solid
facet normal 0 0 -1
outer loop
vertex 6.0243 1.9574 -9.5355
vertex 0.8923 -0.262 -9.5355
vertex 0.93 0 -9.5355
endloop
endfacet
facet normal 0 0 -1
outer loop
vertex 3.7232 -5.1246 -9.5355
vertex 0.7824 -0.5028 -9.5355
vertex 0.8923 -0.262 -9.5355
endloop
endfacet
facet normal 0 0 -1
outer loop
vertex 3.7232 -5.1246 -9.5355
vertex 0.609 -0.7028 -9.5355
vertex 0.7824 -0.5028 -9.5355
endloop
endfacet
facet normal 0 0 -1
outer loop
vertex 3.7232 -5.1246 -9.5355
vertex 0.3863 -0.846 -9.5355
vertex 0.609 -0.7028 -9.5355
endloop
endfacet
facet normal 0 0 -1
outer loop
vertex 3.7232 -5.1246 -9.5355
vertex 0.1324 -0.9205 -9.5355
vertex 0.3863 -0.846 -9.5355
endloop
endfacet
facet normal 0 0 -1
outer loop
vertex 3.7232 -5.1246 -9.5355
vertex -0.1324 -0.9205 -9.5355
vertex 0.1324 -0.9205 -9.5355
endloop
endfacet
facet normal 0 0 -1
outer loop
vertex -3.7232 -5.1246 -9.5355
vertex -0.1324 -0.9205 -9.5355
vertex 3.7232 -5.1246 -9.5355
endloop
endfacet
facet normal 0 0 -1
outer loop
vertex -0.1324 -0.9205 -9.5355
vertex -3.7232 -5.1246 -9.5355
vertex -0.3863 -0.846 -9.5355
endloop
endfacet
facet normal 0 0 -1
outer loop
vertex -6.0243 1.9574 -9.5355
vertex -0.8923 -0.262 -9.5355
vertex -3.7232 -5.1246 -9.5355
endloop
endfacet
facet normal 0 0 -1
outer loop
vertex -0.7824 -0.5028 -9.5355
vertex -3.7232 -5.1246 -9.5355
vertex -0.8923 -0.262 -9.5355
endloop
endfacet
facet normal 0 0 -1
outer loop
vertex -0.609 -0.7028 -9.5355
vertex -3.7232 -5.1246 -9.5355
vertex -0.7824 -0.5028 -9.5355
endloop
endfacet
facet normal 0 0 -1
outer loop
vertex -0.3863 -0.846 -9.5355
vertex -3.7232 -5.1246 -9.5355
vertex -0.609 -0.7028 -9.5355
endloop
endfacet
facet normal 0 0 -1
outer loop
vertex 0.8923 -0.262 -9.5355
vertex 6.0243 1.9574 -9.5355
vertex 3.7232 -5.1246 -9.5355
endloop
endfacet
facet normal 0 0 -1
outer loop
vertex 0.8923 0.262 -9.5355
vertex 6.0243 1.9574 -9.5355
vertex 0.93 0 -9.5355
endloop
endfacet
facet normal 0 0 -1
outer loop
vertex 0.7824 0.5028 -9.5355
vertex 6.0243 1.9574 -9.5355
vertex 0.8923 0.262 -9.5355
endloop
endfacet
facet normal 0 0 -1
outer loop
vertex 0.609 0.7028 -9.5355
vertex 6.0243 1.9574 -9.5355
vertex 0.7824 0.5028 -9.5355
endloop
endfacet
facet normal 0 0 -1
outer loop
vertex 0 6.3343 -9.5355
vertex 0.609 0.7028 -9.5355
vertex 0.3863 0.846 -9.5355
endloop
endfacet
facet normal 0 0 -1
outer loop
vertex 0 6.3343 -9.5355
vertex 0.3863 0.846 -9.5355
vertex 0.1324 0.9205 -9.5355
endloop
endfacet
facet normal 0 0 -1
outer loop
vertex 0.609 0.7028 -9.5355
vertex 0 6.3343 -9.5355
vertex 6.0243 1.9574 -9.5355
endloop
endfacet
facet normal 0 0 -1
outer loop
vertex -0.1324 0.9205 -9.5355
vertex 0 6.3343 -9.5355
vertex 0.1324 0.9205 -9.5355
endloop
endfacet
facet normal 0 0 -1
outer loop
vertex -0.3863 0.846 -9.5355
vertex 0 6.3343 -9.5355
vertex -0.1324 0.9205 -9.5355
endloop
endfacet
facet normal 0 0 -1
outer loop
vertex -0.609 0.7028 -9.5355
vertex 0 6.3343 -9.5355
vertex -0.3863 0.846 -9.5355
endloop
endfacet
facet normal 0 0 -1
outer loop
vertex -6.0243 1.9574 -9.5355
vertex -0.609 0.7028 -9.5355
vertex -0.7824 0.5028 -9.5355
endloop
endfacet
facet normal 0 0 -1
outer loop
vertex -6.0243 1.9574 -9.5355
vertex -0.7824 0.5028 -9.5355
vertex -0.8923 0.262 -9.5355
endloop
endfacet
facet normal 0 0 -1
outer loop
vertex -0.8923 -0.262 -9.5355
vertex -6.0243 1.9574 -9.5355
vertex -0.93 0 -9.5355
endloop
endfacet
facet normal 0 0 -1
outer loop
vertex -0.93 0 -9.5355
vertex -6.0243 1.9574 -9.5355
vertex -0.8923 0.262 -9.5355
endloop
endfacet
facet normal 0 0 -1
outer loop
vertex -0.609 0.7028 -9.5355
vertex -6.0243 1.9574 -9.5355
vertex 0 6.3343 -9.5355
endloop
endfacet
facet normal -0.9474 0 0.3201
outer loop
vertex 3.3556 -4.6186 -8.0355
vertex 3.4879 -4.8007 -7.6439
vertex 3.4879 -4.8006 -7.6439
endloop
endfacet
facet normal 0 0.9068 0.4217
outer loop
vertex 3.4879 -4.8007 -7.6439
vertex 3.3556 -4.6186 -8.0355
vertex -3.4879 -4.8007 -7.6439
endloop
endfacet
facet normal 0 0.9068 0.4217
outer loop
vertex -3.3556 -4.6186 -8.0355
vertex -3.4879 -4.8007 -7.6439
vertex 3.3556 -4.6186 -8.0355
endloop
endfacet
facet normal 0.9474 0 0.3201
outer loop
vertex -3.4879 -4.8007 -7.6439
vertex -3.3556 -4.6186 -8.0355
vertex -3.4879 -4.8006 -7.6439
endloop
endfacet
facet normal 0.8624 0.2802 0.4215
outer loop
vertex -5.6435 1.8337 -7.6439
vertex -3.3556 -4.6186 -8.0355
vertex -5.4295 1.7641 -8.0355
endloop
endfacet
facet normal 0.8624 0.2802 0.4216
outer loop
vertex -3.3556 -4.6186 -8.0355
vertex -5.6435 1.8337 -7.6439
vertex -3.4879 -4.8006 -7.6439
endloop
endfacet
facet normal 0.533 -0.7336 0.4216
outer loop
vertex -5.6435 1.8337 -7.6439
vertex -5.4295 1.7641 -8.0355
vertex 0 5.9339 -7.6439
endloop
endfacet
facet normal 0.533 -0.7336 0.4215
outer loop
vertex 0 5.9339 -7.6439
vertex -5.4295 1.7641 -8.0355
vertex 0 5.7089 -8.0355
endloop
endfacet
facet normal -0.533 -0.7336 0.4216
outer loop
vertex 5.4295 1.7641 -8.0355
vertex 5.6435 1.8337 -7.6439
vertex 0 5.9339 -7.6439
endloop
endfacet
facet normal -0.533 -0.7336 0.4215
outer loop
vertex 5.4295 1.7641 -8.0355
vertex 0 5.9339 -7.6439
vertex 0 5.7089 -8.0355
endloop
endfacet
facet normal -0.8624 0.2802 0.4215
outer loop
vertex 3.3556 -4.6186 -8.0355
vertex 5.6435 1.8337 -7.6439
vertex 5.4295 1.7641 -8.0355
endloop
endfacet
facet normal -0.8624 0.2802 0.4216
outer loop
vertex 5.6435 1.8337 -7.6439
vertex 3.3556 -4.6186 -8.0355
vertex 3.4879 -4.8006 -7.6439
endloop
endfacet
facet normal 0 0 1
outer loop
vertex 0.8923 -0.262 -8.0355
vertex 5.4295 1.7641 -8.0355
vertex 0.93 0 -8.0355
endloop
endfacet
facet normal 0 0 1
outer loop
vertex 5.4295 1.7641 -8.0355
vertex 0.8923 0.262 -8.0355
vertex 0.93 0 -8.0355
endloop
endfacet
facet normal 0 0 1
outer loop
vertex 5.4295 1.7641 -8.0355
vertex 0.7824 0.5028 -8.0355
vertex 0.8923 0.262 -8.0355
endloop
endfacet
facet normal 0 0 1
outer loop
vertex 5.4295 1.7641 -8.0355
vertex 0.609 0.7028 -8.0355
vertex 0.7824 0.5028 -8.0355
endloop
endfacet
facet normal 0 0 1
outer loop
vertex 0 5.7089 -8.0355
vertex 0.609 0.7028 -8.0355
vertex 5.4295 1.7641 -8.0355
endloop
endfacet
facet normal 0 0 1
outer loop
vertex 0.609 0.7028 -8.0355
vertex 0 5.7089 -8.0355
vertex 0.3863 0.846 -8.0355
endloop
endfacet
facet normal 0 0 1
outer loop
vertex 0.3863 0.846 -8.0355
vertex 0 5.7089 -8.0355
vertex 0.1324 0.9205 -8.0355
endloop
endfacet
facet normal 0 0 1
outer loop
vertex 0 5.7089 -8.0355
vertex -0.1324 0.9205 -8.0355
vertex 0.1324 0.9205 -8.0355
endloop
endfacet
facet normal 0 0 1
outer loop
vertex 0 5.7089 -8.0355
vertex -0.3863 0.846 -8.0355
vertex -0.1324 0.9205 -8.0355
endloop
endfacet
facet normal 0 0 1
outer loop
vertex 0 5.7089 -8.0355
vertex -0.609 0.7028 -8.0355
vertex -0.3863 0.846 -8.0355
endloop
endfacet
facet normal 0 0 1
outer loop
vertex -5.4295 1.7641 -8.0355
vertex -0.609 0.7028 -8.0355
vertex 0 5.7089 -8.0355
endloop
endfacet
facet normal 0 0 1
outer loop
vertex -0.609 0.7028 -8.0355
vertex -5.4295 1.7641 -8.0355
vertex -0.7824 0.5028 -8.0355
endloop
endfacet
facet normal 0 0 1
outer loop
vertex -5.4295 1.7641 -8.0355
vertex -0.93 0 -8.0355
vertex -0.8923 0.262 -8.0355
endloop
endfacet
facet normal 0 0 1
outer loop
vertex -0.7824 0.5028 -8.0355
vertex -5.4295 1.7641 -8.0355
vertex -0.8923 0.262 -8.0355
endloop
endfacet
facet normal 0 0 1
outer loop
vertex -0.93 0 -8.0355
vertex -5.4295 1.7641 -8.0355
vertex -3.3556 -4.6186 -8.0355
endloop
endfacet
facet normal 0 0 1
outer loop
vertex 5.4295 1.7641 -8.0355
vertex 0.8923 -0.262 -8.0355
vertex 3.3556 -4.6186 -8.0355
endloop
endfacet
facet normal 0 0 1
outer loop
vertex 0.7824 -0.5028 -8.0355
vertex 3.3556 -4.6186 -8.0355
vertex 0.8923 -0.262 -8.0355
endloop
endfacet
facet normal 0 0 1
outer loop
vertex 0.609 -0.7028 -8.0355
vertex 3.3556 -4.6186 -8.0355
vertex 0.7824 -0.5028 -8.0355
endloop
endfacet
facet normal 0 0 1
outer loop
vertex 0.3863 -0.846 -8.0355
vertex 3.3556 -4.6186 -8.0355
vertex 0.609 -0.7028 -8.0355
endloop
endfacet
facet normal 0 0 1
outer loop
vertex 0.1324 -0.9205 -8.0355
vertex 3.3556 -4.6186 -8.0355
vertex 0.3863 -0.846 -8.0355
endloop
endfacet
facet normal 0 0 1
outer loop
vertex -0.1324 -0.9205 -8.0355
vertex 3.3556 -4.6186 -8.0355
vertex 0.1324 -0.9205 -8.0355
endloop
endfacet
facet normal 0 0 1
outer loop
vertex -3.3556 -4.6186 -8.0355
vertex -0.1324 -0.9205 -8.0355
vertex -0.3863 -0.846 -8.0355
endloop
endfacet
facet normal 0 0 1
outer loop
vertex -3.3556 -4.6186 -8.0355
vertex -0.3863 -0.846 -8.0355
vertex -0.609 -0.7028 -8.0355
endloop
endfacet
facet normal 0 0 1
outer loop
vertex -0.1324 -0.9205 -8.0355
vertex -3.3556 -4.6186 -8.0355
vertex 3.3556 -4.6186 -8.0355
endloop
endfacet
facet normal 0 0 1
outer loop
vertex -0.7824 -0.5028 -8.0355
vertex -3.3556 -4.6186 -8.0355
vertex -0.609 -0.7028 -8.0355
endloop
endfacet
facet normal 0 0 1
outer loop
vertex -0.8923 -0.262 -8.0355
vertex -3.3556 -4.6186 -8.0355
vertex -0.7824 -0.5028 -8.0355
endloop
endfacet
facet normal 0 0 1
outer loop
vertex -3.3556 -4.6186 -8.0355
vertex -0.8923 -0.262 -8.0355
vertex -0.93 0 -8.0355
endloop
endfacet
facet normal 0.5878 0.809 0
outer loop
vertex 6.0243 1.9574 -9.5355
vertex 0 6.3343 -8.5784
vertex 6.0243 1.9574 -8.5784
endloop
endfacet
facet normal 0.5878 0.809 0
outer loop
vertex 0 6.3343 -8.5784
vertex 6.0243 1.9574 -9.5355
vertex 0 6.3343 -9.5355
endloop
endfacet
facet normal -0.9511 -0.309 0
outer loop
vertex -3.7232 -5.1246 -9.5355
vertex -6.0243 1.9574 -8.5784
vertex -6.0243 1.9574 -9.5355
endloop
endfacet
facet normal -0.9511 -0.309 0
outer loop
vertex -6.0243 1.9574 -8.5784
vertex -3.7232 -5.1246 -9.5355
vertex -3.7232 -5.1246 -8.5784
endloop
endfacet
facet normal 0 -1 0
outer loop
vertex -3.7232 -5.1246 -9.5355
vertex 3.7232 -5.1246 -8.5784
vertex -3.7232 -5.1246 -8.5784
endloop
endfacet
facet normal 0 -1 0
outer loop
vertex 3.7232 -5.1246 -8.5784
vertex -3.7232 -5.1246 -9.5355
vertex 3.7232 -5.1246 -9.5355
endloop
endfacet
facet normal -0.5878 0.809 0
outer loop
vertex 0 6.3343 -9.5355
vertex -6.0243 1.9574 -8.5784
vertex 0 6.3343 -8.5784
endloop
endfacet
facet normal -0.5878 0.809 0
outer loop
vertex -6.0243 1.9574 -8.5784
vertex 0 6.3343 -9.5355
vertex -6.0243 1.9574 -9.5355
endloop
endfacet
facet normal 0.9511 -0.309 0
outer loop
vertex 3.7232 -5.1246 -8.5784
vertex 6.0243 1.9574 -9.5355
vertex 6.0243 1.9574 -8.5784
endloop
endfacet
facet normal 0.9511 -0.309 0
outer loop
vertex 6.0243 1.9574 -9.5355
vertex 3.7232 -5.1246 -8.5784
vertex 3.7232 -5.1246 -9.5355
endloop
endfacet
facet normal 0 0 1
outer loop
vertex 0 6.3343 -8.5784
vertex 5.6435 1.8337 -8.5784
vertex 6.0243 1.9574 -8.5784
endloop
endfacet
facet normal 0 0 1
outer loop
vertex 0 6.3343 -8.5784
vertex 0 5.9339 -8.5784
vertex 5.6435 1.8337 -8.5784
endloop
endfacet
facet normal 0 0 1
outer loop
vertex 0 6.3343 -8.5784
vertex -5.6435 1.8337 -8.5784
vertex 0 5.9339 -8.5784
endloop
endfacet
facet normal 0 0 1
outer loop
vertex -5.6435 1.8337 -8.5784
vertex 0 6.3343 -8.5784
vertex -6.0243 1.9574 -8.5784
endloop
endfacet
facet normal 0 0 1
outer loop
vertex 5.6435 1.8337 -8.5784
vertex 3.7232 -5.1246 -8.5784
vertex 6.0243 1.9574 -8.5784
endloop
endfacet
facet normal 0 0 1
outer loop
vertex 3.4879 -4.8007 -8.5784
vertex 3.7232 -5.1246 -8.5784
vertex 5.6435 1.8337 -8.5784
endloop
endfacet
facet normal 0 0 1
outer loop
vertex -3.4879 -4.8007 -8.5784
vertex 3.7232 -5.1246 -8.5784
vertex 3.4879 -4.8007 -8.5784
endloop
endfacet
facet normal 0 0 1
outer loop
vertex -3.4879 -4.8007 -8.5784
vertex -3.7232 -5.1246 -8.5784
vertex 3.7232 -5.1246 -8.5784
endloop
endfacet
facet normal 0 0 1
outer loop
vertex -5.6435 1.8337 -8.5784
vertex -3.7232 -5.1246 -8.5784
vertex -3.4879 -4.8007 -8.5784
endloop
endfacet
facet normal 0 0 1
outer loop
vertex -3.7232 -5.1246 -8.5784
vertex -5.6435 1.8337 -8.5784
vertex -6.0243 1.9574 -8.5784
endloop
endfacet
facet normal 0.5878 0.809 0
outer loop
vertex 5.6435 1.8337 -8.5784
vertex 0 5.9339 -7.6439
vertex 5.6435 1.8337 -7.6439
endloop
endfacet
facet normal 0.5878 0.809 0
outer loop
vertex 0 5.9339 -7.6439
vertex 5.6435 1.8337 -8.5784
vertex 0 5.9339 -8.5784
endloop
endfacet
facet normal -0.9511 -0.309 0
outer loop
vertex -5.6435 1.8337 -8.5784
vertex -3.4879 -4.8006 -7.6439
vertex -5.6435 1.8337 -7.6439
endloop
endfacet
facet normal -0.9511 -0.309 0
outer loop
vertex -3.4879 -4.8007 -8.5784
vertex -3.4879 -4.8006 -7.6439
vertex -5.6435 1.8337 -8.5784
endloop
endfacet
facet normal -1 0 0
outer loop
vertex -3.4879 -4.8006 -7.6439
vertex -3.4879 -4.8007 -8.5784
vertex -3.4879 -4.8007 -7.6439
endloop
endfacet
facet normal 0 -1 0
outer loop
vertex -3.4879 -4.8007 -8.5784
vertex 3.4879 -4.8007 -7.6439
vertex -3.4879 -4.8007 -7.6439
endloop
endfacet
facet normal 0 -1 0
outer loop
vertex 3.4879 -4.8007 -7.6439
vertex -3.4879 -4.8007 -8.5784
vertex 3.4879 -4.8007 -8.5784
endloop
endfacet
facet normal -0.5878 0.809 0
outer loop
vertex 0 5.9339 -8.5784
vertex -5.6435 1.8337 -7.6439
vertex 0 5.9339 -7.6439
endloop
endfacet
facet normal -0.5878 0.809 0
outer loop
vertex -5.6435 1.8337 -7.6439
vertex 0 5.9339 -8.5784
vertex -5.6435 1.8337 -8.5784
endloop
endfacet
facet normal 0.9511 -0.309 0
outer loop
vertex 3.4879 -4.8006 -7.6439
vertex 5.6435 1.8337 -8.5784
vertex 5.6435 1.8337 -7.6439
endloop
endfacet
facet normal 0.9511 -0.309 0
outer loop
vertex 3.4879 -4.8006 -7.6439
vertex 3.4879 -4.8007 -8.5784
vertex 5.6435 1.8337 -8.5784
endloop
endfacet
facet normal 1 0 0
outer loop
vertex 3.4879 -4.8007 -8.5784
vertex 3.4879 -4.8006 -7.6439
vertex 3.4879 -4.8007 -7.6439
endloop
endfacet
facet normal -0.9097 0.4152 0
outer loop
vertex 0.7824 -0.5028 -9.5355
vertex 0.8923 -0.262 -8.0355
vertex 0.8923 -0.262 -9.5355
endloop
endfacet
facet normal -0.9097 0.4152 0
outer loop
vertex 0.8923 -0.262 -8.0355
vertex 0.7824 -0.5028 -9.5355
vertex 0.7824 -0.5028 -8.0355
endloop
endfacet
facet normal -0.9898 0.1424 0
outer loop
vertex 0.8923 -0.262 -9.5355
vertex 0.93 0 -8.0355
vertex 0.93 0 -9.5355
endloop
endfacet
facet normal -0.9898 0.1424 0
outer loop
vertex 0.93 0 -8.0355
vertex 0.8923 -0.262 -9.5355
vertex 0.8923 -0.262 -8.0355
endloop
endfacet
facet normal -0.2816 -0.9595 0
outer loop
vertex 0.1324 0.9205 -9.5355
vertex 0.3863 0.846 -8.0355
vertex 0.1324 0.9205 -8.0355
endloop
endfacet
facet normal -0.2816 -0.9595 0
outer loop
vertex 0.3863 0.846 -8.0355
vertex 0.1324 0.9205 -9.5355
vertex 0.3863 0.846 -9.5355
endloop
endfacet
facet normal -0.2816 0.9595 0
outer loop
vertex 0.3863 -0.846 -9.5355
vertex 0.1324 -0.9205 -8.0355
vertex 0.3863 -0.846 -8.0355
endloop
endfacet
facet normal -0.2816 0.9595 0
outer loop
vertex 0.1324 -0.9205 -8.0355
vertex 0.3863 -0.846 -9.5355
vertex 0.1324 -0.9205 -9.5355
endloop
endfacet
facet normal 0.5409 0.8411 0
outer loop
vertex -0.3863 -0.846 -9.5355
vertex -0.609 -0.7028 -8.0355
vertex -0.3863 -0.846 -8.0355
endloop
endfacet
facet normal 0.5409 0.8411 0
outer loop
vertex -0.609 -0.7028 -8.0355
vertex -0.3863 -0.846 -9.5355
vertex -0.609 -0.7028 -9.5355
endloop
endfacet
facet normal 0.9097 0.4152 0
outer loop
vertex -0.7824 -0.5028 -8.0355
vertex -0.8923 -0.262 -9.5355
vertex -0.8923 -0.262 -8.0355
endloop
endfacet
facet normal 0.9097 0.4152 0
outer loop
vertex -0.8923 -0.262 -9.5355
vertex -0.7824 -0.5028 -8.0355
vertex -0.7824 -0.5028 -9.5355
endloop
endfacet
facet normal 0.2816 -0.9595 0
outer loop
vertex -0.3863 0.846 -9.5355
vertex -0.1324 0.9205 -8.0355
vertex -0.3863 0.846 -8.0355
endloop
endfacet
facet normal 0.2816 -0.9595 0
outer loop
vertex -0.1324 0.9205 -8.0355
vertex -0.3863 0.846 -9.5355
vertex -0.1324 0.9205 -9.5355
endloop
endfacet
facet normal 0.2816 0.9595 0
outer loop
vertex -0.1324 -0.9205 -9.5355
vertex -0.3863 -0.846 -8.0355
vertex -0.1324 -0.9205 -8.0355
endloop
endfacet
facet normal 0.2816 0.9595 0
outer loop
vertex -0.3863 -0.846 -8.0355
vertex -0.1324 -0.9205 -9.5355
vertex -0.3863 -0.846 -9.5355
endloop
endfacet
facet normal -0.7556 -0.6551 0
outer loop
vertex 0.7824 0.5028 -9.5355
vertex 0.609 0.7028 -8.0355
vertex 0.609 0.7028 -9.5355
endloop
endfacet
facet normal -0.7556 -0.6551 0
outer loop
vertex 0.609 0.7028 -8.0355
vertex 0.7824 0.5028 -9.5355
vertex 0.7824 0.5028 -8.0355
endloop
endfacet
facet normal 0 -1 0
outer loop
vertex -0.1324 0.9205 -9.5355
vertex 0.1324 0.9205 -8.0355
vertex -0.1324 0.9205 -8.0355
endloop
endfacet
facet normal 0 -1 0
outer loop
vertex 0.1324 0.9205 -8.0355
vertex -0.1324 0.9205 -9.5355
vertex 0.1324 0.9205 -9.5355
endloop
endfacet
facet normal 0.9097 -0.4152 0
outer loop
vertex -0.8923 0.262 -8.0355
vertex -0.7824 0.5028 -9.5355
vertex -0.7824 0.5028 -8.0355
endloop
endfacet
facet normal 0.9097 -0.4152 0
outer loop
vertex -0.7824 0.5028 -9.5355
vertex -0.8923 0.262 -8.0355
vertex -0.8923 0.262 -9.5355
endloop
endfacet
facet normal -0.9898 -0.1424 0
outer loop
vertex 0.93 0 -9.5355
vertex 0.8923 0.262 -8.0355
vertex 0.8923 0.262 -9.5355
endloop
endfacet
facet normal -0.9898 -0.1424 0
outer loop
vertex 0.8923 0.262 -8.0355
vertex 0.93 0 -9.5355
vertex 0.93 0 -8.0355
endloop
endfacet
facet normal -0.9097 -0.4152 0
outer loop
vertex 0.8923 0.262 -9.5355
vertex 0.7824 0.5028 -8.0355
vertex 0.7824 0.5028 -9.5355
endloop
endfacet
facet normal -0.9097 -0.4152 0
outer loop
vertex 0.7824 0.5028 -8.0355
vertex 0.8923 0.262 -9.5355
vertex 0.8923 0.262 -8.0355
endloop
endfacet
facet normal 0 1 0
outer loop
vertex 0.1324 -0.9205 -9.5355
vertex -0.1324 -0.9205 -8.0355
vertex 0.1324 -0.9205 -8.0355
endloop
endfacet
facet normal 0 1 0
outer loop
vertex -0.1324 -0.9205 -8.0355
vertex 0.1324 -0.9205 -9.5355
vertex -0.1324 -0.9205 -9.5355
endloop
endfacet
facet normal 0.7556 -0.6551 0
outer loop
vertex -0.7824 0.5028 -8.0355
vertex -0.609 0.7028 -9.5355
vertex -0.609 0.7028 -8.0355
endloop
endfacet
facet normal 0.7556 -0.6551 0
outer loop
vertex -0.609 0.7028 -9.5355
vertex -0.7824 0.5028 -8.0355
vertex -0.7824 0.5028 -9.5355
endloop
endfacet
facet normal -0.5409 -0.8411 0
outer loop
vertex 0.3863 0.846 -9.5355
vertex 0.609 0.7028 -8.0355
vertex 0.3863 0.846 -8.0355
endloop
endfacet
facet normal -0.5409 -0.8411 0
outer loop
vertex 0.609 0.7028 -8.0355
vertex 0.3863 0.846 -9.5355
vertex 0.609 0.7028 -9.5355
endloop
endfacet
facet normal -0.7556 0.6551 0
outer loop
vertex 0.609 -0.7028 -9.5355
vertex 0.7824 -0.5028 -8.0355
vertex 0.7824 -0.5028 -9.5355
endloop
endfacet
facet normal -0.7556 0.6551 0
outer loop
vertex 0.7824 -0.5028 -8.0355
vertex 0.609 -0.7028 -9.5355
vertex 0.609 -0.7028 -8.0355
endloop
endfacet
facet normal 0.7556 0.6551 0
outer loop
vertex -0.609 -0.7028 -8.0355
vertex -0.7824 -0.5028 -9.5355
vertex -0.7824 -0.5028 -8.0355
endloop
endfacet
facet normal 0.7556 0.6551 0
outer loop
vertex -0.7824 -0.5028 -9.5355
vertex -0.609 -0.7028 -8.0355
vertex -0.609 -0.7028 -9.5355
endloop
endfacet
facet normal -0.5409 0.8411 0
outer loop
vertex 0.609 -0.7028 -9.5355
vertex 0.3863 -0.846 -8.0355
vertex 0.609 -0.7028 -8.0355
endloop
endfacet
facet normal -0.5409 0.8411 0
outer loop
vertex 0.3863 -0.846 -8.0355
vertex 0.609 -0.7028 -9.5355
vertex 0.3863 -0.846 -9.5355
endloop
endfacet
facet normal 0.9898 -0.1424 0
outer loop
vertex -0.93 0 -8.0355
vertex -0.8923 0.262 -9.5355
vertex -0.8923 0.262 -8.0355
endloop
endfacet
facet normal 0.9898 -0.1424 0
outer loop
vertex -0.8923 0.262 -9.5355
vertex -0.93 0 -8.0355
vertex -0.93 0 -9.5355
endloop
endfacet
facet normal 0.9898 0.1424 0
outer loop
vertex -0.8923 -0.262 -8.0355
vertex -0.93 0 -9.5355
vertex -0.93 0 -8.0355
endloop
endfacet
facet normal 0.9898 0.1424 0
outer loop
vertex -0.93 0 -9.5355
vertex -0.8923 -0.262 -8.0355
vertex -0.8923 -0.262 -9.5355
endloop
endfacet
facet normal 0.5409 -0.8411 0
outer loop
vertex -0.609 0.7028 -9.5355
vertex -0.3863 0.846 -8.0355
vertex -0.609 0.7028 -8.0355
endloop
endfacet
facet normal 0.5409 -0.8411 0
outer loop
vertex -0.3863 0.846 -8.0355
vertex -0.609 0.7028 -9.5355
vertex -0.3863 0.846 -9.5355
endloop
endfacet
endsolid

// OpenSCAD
hauteurExt = 19.071; // équivalent sphère circonscrite 24 mm
epaisseurParoi = 1.5;
diametreTrouBouchon = 2;
r = 0.19; // résolution d'impression sur l'axe Z
echelleReductionAjustementBouchon = 0.93;

//corps_ouvert();
//bouchon_avec_attache();
rotate([180, 0, 0])
bouchon_trou();

module corps_ouvert() {
	difference() {
		dode_creux();
		decoupe_bouchon();
	}
}

module bouchon_avec_attache() {
	scale([echelleReductionAjustementBouchon, echelleReductionAjustementBouchon, 1])
	union () {
		intersection() {
			dode_creux();
			decoupe_bouchon();
		}
		translate([0, 0, hauteurExt/2])
		rotate([90, 0, 54])
		rotate_extrude(convexity = 10, $fn=40)
		translate([1, 0, 0])
		circle(r = 0.5, $fn=40);
	}
}

module bouchon_trou() {
	scale([echelleReductionAjustementBouchon, echelleReductionAjustementBouchon, 1])
	difference () {
		intersection() {
			dode_creux();
			decoupe_bouchon();
		}
		translate([0, 0, hauteurExt/2.5])
		cylinder(30, r=diametreTrouBouchon/2, $fn=22);
	}
}

module dode_creux() {
	difference() {
		dodecahedron(hauteurExt);
		dodecahedron(hauteurExt - 2 * epaisseurParoi);
	}
}

module decoupe_bouchon() {
	rotate([0,0,54]) translate([0,0,hauteurExt/2.5+5*r])
		cylinder(6*r, r=hauteurExt/2.8, $fn=5);
	rotate([0,0,54]) translate([0,0,hauteurExt/2.5])
		cylinder(6*r, r=hauteurExt/2.42-epaisseurParoi, $fn=5);
}

module dodecahedron(height) {
	scale([height,height,height]) {
		intersection() {
			cube([2,2,1], center = true); 
			intersection_for(i=[0:4]) { 
				rotate([0,0,72*i])
				rotate([116.565,0,0])
					cube([2,2,1], center = true); 
			}
		}
	}
}
